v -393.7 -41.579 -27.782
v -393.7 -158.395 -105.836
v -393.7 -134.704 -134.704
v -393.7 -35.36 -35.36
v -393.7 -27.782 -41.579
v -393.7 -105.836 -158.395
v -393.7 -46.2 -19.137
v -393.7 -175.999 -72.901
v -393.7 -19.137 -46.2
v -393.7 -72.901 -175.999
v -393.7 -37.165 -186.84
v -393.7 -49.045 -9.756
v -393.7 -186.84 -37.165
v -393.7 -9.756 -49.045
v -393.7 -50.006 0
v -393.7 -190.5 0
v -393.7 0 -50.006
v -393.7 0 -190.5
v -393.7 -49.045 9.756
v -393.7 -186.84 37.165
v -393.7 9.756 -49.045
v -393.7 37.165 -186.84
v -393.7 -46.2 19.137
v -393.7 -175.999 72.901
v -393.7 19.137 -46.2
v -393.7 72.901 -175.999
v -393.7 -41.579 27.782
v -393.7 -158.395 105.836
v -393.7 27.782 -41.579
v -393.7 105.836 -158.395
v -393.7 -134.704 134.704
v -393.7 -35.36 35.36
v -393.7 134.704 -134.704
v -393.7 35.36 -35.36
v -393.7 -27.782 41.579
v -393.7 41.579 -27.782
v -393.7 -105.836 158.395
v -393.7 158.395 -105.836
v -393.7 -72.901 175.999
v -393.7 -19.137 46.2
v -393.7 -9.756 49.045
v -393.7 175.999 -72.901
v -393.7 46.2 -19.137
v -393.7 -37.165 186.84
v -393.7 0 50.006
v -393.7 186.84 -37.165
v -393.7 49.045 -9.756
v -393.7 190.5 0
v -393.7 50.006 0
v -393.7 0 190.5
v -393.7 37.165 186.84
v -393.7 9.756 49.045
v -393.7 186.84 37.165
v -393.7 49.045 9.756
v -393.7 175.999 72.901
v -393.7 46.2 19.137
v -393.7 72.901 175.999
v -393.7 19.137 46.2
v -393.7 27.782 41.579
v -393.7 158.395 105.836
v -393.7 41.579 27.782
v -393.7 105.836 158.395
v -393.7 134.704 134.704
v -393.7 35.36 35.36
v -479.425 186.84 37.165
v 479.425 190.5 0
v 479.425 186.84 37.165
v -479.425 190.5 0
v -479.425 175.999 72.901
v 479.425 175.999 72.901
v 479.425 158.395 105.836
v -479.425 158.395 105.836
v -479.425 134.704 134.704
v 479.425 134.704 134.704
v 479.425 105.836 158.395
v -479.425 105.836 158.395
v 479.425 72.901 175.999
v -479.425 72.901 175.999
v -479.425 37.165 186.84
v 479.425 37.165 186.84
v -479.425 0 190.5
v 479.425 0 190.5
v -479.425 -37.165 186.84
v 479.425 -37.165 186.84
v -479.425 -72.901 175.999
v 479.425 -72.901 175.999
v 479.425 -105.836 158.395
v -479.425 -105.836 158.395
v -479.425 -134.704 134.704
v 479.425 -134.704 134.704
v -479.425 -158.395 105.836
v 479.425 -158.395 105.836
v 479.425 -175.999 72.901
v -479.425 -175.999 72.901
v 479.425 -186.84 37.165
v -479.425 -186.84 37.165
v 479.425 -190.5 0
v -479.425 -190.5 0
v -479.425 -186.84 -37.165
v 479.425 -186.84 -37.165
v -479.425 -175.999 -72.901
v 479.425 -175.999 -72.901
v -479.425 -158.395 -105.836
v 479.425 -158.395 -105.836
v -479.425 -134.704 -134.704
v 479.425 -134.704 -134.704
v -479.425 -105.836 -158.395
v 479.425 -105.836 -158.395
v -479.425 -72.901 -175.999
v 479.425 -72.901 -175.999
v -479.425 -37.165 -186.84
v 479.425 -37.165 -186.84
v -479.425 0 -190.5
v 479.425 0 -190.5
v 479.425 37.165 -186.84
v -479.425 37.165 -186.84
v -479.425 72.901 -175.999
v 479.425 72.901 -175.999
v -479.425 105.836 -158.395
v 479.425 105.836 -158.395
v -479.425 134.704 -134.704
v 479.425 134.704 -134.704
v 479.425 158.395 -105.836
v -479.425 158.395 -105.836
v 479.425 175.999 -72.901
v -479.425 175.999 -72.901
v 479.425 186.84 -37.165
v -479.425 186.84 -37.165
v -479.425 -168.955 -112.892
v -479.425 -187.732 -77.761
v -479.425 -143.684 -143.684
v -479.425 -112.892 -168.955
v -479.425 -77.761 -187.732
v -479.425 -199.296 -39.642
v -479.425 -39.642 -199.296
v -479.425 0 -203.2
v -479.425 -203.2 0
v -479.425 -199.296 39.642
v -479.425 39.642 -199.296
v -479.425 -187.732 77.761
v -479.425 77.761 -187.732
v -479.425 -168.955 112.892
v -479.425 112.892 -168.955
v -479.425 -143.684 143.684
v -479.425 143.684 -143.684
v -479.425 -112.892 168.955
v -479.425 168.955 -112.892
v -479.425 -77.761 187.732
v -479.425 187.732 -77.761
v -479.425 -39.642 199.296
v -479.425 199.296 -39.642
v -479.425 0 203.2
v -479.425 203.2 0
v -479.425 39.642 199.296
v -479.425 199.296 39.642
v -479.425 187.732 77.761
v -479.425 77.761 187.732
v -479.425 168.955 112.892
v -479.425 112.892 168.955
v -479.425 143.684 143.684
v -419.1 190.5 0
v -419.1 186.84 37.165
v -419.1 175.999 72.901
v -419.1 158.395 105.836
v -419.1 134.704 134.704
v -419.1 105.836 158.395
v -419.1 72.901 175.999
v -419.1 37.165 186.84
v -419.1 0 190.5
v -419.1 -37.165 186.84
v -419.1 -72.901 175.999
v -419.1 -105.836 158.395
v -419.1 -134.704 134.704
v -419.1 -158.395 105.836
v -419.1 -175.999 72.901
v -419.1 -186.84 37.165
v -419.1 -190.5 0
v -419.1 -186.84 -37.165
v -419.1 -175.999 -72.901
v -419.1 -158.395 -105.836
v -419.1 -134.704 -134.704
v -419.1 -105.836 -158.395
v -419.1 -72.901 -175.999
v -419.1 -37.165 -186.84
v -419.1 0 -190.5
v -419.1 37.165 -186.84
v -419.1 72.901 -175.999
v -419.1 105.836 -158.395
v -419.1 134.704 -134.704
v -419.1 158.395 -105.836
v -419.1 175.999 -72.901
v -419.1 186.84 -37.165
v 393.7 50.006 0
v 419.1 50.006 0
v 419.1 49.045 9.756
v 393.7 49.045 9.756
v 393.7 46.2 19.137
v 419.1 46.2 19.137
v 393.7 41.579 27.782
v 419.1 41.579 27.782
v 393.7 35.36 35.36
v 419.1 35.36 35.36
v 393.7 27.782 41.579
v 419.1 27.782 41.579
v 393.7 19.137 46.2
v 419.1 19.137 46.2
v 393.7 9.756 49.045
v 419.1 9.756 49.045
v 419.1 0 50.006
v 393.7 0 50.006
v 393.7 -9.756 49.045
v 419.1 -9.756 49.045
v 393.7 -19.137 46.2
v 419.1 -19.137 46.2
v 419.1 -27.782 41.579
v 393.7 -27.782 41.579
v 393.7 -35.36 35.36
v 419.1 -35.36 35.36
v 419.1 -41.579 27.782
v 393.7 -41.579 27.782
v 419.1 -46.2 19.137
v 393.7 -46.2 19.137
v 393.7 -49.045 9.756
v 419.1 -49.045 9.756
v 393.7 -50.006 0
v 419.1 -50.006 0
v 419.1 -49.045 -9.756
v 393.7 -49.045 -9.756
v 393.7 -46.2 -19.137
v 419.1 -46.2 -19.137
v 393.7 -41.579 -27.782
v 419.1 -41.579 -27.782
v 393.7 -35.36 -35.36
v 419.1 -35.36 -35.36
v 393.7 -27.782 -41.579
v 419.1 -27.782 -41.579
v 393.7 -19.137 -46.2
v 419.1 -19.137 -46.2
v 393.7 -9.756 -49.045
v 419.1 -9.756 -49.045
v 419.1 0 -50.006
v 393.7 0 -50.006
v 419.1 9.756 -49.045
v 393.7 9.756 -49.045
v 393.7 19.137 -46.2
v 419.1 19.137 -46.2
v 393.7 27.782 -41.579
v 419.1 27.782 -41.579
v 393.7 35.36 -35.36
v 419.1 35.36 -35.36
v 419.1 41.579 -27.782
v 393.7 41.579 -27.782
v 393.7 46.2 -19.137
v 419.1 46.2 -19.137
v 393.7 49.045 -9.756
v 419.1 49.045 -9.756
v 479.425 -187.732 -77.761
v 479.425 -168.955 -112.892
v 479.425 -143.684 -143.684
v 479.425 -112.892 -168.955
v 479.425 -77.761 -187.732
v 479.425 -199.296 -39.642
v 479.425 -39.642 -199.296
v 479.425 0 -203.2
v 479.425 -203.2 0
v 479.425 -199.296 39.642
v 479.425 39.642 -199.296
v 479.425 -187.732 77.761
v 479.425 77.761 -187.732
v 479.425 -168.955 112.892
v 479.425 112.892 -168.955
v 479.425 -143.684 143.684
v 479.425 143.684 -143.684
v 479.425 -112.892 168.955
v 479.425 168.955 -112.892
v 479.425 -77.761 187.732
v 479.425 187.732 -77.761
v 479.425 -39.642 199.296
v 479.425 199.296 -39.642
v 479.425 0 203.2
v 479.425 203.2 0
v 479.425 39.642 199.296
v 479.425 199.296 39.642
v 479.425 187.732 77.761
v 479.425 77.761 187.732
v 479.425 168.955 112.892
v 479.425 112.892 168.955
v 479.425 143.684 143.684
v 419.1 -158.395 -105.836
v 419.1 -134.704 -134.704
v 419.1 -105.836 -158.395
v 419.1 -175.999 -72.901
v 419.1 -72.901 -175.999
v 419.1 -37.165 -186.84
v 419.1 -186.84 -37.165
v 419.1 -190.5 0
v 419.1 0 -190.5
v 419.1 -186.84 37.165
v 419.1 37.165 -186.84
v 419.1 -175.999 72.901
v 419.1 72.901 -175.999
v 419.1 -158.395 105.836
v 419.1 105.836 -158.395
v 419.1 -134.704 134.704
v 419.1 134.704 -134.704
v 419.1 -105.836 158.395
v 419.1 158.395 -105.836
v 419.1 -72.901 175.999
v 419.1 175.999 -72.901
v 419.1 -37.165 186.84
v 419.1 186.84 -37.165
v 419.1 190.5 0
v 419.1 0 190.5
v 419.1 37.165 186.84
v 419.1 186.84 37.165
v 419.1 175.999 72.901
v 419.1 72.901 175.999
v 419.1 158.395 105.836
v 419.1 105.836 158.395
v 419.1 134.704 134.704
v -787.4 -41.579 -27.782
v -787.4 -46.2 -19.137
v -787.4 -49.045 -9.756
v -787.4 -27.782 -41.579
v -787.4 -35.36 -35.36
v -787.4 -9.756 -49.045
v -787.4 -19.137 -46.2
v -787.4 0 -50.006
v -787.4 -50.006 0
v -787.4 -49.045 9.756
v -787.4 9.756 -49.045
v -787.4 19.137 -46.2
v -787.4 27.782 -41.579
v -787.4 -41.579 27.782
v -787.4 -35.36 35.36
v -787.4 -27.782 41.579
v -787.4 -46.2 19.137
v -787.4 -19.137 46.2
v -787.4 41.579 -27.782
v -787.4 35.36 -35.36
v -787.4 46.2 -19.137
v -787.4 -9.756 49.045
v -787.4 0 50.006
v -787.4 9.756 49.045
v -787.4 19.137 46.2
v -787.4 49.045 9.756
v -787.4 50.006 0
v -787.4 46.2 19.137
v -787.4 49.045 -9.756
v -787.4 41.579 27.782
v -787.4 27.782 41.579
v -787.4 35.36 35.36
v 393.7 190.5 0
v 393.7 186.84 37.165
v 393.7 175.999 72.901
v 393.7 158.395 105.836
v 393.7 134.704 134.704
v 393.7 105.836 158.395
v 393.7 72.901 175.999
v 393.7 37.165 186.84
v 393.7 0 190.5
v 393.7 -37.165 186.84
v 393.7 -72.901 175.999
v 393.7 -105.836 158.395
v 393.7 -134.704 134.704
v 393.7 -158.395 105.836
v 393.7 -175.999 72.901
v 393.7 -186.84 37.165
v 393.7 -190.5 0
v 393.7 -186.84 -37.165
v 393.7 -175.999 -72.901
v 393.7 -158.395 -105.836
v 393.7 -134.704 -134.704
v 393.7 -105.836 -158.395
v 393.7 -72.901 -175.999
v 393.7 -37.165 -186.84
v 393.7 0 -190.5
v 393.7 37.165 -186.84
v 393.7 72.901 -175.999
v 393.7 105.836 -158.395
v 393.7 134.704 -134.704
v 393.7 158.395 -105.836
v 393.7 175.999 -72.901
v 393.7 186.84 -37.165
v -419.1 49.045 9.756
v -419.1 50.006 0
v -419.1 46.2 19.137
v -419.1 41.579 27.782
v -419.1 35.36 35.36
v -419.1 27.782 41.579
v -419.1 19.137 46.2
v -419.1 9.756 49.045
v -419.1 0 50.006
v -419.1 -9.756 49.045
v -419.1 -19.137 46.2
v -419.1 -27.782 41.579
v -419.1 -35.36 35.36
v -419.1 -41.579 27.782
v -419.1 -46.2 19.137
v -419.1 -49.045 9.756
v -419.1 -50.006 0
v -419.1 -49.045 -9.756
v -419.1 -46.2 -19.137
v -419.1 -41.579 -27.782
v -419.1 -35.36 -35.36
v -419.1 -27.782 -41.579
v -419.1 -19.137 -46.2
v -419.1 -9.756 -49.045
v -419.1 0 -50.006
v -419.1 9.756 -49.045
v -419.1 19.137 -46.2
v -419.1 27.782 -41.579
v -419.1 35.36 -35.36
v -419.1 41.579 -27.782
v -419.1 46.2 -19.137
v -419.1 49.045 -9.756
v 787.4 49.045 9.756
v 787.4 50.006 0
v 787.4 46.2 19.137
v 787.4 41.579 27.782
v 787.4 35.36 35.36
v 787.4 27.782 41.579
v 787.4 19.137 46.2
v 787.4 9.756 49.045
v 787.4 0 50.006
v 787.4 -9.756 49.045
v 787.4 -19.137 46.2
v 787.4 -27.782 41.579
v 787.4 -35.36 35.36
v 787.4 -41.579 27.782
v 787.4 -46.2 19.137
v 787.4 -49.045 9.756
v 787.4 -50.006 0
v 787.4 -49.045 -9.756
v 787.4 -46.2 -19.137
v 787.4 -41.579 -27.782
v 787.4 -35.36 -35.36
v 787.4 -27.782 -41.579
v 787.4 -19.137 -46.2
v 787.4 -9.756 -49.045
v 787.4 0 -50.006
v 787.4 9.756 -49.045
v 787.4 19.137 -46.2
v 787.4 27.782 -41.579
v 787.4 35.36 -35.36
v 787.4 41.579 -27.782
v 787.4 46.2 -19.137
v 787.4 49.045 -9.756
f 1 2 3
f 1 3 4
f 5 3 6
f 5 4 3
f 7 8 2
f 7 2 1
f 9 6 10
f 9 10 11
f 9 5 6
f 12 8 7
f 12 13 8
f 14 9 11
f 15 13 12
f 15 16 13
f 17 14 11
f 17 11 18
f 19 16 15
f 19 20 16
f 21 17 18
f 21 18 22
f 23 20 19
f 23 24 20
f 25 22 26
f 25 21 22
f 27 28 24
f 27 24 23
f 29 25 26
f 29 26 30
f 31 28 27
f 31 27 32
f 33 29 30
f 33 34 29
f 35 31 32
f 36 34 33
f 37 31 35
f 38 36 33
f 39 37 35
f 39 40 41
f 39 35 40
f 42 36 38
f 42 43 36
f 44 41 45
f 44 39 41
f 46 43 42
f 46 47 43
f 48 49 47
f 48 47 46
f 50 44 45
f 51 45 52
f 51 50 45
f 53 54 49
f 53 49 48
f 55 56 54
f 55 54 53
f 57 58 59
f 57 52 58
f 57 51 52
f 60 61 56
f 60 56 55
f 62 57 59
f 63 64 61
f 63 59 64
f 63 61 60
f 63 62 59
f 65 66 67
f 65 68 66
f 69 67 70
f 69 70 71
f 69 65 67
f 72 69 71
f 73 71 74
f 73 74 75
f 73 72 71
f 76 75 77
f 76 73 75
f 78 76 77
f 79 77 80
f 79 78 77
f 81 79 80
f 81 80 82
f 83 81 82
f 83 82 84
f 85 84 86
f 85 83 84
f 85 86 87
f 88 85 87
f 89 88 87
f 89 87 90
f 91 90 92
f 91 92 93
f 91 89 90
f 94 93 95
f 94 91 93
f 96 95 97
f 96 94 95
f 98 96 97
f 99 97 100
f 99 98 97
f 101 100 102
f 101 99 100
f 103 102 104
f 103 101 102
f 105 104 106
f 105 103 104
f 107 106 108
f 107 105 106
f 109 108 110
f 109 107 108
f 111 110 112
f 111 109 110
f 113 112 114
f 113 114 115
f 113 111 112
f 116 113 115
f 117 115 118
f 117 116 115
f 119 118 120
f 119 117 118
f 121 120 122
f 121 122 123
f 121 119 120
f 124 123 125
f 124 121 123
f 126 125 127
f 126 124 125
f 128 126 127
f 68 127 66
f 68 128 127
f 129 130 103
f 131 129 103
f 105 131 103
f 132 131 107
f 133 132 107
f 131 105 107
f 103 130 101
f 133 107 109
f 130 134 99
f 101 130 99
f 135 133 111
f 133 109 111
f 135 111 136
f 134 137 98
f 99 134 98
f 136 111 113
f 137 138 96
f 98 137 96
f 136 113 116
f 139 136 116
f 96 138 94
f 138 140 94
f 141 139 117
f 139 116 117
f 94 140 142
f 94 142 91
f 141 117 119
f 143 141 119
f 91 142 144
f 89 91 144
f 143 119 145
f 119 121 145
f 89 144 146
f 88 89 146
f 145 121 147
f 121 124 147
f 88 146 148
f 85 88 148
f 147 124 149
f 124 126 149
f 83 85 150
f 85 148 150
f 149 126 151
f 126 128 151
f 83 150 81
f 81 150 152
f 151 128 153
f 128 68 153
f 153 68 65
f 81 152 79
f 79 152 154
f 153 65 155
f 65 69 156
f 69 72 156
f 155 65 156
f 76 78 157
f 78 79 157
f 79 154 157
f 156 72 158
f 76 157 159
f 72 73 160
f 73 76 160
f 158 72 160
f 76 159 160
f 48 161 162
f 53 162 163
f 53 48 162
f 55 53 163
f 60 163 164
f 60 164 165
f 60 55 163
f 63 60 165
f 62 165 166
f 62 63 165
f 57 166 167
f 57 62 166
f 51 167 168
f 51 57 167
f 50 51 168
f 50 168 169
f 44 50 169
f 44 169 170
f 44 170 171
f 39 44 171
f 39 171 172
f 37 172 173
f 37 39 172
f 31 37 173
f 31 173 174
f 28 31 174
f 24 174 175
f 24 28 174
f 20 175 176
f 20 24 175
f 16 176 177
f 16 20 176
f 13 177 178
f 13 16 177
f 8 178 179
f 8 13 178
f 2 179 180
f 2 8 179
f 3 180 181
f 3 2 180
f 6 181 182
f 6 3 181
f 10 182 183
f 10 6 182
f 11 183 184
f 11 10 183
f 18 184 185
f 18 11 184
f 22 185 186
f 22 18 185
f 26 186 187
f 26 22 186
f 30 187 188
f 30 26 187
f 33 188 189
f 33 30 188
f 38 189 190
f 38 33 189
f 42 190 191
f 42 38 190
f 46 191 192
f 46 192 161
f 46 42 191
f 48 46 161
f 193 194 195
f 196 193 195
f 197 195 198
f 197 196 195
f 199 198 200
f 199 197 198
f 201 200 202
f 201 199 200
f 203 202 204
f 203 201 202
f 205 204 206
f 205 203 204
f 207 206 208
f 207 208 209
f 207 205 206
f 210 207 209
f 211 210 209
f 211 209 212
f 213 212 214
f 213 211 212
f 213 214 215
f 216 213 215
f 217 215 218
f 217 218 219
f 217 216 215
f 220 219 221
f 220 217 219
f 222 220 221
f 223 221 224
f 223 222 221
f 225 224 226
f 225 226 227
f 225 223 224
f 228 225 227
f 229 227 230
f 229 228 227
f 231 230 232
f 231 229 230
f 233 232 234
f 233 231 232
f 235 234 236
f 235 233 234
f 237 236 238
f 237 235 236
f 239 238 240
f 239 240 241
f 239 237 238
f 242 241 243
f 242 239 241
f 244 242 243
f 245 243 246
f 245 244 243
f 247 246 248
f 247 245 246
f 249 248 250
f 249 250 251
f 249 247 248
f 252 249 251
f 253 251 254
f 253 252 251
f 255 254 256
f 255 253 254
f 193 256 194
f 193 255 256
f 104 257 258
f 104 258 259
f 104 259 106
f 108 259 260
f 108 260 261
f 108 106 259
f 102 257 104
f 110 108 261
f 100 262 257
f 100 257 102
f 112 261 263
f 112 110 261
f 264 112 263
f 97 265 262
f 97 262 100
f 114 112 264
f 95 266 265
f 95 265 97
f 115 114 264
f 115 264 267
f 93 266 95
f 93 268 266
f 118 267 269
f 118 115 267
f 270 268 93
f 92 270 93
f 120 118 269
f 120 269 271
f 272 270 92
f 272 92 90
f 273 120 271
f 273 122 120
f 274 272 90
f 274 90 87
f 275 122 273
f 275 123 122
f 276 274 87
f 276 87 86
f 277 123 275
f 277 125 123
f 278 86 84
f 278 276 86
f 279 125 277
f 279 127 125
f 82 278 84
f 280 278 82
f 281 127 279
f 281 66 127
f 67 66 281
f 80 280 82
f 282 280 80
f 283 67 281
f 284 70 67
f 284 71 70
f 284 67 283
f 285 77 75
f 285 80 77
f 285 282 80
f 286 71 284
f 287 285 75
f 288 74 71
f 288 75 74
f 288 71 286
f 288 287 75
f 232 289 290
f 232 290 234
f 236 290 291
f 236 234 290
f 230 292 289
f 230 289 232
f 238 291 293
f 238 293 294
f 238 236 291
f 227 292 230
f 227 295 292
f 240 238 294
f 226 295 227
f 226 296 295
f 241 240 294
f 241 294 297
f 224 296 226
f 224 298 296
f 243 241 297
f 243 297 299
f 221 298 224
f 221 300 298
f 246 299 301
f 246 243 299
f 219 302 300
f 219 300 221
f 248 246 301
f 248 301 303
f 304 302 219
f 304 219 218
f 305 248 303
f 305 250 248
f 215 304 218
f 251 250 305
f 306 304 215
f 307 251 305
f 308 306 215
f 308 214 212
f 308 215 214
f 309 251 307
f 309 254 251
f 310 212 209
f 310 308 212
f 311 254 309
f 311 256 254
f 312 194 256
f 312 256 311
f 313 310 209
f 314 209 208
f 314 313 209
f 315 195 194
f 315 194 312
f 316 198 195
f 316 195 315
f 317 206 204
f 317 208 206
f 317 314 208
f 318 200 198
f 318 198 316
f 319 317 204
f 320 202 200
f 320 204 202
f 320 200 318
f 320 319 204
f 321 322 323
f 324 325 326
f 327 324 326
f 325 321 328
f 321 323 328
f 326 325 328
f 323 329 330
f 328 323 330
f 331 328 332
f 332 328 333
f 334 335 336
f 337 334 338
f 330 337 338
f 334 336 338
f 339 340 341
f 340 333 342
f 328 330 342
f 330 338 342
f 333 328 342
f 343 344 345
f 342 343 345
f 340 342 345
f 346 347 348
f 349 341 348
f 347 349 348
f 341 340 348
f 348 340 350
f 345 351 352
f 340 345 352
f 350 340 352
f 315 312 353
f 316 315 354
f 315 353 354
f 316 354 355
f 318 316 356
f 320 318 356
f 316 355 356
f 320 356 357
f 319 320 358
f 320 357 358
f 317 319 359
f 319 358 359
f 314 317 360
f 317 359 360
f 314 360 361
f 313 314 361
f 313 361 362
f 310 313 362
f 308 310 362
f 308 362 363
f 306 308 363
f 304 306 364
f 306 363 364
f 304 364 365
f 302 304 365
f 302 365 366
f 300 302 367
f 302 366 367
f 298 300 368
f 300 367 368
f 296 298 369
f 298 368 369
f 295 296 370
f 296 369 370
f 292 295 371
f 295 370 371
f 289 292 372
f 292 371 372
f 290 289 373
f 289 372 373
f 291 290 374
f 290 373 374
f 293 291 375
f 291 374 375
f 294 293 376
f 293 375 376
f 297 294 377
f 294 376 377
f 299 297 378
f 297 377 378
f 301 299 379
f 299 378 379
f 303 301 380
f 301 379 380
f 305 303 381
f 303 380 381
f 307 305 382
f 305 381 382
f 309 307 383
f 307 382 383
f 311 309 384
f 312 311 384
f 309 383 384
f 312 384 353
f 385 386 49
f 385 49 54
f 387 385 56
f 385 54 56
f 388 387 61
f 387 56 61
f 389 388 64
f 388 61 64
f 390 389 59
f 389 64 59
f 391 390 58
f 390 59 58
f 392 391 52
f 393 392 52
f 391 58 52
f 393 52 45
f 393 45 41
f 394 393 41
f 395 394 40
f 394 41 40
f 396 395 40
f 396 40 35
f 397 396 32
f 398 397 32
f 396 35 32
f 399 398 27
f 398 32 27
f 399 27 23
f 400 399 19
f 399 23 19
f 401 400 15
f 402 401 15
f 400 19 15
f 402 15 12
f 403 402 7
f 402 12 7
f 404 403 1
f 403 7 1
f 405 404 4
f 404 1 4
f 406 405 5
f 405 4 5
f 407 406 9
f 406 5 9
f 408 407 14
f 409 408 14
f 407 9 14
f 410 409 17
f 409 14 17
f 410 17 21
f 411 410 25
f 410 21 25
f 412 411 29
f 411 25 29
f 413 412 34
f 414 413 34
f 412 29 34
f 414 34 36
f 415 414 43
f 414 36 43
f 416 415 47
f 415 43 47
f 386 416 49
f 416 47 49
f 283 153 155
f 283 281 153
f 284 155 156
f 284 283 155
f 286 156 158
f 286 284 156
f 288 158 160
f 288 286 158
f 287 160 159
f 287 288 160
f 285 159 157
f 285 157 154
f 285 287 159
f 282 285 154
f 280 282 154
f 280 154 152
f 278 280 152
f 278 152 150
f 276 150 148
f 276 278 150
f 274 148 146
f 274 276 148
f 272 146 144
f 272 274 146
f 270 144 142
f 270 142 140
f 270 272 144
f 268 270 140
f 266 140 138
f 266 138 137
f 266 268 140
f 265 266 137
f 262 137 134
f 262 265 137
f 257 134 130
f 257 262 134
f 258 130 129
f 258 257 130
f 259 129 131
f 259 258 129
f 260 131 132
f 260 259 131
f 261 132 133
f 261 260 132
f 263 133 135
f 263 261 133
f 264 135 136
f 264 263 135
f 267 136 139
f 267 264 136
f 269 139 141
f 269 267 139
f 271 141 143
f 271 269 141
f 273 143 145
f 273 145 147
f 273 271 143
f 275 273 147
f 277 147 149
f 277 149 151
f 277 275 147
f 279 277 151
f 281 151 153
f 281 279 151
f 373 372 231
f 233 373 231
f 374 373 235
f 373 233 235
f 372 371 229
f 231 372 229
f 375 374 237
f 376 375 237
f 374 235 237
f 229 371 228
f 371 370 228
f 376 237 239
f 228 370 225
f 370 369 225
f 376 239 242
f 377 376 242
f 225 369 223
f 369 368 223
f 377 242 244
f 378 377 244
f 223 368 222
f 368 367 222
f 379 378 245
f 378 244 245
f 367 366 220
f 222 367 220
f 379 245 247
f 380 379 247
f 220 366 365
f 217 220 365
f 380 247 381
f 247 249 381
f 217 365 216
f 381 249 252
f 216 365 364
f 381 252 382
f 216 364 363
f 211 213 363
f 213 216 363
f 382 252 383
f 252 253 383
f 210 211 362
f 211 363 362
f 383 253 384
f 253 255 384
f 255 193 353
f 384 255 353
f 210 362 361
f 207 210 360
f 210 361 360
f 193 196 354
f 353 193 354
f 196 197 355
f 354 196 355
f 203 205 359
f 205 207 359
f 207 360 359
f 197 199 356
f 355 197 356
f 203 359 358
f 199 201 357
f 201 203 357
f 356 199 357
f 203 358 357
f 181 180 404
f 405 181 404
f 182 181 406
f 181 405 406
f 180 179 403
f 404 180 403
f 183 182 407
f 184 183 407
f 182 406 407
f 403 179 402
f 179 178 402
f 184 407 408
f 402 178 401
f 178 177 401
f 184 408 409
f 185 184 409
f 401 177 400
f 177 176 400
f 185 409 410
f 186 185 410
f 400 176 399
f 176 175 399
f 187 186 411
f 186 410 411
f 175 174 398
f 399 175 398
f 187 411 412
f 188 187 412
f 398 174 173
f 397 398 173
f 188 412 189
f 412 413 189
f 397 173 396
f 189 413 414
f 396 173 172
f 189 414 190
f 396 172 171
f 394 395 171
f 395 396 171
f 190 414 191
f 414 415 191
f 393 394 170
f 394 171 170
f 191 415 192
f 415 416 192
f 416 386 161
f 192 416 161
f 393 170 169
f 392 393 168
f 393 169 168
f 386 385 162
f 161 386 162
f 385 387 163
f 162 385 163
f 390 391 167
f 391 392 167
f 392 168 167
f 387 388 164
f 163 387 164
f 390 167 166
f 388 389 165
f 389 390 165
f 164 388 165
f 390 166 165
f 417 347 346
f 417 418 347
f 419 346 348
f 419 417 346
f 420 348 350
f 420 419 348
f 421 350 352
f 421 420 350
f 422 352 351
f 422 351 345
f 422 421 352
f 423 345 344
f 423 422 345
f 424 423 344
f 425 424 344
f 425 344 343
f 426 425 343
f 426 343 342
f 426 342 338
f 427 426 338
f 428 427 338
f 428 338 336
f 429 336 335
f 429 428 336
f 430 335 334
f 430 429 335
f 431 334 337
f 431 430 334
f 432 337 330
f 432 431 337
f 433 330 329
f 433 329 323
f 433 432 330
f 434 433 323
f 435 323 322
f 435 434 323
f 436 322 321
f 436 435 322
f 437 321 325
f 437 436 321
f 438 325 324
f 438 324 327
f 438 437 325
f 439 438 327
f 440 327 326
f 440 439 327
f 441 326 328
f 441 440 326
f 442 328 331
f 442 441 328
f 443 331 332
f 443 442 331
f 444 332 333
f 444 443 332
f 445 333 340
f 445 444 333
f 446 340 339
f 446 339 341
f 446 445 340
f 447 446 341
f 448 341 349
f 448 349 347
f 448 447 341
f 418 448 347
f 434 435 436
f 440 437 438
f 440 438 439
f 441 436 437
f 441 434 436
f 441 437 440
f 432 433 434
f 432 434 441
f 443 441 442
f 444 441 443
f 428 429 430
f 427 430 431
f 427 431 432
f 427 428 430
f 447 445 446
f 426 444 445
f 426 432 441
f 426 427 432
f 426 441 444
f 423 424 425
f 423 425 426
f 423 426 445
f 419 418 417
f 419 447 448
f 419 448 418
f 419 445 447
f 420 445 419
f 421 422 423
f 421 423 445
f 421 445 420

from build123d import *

# Parameters (mm, degrees)
F0_R     = 203.2
F0_R_2   = 190.5
F1_DEPTH = 479.425
F0_R_3   = 50.00625
F2_DEPTH = 787.4
F3_START = 393.7
F3_DEPTH = 25.4
F4_START = -393.7
F4_DEPTH = 25.4


with BuildPart() as f1:
    # F0 (on Right) → F1 (new body, symmetric)
    with BuildSketch(Plane.YZ):
        Circle(F0_R)
        Circle(F0_R_2, mode=Mode.SUBTRACT)
    extrude(amount=F1_DEPTH, both=True)


with BuildPart() as f2:
    # F0 (on Right) → F2 (new body, symmetric)
    with BuildSketch(Plane.YZ):
        Circle(F0_R_3)
    extrude(amount=F2_DEPTH, both=True)


with BuildPart() as f3:
    # F0 (on Right) → F3 (new body)
    with BuildSketch(Plane.YZ.offset(F3_START)):
        Circle(F0_R_2)
        Circle(F0_R_3, mode=Mode.SUBTRACT)
    extrude(amount=F3_DEPTH)


with BuildPart() as f4:
    # F0 (on Right) → F4 (new body)
    with BuildSketch(Plane.YZ.offset(F4_START)):
        Circle(F0_R_2)
        Circle(F0_R_3, mode=Mode.SUBTRACT)
    extrude(amount=-F4_DEPTH)


solid = Compound([f1.part, f2.part, f3.part, f4.part])
